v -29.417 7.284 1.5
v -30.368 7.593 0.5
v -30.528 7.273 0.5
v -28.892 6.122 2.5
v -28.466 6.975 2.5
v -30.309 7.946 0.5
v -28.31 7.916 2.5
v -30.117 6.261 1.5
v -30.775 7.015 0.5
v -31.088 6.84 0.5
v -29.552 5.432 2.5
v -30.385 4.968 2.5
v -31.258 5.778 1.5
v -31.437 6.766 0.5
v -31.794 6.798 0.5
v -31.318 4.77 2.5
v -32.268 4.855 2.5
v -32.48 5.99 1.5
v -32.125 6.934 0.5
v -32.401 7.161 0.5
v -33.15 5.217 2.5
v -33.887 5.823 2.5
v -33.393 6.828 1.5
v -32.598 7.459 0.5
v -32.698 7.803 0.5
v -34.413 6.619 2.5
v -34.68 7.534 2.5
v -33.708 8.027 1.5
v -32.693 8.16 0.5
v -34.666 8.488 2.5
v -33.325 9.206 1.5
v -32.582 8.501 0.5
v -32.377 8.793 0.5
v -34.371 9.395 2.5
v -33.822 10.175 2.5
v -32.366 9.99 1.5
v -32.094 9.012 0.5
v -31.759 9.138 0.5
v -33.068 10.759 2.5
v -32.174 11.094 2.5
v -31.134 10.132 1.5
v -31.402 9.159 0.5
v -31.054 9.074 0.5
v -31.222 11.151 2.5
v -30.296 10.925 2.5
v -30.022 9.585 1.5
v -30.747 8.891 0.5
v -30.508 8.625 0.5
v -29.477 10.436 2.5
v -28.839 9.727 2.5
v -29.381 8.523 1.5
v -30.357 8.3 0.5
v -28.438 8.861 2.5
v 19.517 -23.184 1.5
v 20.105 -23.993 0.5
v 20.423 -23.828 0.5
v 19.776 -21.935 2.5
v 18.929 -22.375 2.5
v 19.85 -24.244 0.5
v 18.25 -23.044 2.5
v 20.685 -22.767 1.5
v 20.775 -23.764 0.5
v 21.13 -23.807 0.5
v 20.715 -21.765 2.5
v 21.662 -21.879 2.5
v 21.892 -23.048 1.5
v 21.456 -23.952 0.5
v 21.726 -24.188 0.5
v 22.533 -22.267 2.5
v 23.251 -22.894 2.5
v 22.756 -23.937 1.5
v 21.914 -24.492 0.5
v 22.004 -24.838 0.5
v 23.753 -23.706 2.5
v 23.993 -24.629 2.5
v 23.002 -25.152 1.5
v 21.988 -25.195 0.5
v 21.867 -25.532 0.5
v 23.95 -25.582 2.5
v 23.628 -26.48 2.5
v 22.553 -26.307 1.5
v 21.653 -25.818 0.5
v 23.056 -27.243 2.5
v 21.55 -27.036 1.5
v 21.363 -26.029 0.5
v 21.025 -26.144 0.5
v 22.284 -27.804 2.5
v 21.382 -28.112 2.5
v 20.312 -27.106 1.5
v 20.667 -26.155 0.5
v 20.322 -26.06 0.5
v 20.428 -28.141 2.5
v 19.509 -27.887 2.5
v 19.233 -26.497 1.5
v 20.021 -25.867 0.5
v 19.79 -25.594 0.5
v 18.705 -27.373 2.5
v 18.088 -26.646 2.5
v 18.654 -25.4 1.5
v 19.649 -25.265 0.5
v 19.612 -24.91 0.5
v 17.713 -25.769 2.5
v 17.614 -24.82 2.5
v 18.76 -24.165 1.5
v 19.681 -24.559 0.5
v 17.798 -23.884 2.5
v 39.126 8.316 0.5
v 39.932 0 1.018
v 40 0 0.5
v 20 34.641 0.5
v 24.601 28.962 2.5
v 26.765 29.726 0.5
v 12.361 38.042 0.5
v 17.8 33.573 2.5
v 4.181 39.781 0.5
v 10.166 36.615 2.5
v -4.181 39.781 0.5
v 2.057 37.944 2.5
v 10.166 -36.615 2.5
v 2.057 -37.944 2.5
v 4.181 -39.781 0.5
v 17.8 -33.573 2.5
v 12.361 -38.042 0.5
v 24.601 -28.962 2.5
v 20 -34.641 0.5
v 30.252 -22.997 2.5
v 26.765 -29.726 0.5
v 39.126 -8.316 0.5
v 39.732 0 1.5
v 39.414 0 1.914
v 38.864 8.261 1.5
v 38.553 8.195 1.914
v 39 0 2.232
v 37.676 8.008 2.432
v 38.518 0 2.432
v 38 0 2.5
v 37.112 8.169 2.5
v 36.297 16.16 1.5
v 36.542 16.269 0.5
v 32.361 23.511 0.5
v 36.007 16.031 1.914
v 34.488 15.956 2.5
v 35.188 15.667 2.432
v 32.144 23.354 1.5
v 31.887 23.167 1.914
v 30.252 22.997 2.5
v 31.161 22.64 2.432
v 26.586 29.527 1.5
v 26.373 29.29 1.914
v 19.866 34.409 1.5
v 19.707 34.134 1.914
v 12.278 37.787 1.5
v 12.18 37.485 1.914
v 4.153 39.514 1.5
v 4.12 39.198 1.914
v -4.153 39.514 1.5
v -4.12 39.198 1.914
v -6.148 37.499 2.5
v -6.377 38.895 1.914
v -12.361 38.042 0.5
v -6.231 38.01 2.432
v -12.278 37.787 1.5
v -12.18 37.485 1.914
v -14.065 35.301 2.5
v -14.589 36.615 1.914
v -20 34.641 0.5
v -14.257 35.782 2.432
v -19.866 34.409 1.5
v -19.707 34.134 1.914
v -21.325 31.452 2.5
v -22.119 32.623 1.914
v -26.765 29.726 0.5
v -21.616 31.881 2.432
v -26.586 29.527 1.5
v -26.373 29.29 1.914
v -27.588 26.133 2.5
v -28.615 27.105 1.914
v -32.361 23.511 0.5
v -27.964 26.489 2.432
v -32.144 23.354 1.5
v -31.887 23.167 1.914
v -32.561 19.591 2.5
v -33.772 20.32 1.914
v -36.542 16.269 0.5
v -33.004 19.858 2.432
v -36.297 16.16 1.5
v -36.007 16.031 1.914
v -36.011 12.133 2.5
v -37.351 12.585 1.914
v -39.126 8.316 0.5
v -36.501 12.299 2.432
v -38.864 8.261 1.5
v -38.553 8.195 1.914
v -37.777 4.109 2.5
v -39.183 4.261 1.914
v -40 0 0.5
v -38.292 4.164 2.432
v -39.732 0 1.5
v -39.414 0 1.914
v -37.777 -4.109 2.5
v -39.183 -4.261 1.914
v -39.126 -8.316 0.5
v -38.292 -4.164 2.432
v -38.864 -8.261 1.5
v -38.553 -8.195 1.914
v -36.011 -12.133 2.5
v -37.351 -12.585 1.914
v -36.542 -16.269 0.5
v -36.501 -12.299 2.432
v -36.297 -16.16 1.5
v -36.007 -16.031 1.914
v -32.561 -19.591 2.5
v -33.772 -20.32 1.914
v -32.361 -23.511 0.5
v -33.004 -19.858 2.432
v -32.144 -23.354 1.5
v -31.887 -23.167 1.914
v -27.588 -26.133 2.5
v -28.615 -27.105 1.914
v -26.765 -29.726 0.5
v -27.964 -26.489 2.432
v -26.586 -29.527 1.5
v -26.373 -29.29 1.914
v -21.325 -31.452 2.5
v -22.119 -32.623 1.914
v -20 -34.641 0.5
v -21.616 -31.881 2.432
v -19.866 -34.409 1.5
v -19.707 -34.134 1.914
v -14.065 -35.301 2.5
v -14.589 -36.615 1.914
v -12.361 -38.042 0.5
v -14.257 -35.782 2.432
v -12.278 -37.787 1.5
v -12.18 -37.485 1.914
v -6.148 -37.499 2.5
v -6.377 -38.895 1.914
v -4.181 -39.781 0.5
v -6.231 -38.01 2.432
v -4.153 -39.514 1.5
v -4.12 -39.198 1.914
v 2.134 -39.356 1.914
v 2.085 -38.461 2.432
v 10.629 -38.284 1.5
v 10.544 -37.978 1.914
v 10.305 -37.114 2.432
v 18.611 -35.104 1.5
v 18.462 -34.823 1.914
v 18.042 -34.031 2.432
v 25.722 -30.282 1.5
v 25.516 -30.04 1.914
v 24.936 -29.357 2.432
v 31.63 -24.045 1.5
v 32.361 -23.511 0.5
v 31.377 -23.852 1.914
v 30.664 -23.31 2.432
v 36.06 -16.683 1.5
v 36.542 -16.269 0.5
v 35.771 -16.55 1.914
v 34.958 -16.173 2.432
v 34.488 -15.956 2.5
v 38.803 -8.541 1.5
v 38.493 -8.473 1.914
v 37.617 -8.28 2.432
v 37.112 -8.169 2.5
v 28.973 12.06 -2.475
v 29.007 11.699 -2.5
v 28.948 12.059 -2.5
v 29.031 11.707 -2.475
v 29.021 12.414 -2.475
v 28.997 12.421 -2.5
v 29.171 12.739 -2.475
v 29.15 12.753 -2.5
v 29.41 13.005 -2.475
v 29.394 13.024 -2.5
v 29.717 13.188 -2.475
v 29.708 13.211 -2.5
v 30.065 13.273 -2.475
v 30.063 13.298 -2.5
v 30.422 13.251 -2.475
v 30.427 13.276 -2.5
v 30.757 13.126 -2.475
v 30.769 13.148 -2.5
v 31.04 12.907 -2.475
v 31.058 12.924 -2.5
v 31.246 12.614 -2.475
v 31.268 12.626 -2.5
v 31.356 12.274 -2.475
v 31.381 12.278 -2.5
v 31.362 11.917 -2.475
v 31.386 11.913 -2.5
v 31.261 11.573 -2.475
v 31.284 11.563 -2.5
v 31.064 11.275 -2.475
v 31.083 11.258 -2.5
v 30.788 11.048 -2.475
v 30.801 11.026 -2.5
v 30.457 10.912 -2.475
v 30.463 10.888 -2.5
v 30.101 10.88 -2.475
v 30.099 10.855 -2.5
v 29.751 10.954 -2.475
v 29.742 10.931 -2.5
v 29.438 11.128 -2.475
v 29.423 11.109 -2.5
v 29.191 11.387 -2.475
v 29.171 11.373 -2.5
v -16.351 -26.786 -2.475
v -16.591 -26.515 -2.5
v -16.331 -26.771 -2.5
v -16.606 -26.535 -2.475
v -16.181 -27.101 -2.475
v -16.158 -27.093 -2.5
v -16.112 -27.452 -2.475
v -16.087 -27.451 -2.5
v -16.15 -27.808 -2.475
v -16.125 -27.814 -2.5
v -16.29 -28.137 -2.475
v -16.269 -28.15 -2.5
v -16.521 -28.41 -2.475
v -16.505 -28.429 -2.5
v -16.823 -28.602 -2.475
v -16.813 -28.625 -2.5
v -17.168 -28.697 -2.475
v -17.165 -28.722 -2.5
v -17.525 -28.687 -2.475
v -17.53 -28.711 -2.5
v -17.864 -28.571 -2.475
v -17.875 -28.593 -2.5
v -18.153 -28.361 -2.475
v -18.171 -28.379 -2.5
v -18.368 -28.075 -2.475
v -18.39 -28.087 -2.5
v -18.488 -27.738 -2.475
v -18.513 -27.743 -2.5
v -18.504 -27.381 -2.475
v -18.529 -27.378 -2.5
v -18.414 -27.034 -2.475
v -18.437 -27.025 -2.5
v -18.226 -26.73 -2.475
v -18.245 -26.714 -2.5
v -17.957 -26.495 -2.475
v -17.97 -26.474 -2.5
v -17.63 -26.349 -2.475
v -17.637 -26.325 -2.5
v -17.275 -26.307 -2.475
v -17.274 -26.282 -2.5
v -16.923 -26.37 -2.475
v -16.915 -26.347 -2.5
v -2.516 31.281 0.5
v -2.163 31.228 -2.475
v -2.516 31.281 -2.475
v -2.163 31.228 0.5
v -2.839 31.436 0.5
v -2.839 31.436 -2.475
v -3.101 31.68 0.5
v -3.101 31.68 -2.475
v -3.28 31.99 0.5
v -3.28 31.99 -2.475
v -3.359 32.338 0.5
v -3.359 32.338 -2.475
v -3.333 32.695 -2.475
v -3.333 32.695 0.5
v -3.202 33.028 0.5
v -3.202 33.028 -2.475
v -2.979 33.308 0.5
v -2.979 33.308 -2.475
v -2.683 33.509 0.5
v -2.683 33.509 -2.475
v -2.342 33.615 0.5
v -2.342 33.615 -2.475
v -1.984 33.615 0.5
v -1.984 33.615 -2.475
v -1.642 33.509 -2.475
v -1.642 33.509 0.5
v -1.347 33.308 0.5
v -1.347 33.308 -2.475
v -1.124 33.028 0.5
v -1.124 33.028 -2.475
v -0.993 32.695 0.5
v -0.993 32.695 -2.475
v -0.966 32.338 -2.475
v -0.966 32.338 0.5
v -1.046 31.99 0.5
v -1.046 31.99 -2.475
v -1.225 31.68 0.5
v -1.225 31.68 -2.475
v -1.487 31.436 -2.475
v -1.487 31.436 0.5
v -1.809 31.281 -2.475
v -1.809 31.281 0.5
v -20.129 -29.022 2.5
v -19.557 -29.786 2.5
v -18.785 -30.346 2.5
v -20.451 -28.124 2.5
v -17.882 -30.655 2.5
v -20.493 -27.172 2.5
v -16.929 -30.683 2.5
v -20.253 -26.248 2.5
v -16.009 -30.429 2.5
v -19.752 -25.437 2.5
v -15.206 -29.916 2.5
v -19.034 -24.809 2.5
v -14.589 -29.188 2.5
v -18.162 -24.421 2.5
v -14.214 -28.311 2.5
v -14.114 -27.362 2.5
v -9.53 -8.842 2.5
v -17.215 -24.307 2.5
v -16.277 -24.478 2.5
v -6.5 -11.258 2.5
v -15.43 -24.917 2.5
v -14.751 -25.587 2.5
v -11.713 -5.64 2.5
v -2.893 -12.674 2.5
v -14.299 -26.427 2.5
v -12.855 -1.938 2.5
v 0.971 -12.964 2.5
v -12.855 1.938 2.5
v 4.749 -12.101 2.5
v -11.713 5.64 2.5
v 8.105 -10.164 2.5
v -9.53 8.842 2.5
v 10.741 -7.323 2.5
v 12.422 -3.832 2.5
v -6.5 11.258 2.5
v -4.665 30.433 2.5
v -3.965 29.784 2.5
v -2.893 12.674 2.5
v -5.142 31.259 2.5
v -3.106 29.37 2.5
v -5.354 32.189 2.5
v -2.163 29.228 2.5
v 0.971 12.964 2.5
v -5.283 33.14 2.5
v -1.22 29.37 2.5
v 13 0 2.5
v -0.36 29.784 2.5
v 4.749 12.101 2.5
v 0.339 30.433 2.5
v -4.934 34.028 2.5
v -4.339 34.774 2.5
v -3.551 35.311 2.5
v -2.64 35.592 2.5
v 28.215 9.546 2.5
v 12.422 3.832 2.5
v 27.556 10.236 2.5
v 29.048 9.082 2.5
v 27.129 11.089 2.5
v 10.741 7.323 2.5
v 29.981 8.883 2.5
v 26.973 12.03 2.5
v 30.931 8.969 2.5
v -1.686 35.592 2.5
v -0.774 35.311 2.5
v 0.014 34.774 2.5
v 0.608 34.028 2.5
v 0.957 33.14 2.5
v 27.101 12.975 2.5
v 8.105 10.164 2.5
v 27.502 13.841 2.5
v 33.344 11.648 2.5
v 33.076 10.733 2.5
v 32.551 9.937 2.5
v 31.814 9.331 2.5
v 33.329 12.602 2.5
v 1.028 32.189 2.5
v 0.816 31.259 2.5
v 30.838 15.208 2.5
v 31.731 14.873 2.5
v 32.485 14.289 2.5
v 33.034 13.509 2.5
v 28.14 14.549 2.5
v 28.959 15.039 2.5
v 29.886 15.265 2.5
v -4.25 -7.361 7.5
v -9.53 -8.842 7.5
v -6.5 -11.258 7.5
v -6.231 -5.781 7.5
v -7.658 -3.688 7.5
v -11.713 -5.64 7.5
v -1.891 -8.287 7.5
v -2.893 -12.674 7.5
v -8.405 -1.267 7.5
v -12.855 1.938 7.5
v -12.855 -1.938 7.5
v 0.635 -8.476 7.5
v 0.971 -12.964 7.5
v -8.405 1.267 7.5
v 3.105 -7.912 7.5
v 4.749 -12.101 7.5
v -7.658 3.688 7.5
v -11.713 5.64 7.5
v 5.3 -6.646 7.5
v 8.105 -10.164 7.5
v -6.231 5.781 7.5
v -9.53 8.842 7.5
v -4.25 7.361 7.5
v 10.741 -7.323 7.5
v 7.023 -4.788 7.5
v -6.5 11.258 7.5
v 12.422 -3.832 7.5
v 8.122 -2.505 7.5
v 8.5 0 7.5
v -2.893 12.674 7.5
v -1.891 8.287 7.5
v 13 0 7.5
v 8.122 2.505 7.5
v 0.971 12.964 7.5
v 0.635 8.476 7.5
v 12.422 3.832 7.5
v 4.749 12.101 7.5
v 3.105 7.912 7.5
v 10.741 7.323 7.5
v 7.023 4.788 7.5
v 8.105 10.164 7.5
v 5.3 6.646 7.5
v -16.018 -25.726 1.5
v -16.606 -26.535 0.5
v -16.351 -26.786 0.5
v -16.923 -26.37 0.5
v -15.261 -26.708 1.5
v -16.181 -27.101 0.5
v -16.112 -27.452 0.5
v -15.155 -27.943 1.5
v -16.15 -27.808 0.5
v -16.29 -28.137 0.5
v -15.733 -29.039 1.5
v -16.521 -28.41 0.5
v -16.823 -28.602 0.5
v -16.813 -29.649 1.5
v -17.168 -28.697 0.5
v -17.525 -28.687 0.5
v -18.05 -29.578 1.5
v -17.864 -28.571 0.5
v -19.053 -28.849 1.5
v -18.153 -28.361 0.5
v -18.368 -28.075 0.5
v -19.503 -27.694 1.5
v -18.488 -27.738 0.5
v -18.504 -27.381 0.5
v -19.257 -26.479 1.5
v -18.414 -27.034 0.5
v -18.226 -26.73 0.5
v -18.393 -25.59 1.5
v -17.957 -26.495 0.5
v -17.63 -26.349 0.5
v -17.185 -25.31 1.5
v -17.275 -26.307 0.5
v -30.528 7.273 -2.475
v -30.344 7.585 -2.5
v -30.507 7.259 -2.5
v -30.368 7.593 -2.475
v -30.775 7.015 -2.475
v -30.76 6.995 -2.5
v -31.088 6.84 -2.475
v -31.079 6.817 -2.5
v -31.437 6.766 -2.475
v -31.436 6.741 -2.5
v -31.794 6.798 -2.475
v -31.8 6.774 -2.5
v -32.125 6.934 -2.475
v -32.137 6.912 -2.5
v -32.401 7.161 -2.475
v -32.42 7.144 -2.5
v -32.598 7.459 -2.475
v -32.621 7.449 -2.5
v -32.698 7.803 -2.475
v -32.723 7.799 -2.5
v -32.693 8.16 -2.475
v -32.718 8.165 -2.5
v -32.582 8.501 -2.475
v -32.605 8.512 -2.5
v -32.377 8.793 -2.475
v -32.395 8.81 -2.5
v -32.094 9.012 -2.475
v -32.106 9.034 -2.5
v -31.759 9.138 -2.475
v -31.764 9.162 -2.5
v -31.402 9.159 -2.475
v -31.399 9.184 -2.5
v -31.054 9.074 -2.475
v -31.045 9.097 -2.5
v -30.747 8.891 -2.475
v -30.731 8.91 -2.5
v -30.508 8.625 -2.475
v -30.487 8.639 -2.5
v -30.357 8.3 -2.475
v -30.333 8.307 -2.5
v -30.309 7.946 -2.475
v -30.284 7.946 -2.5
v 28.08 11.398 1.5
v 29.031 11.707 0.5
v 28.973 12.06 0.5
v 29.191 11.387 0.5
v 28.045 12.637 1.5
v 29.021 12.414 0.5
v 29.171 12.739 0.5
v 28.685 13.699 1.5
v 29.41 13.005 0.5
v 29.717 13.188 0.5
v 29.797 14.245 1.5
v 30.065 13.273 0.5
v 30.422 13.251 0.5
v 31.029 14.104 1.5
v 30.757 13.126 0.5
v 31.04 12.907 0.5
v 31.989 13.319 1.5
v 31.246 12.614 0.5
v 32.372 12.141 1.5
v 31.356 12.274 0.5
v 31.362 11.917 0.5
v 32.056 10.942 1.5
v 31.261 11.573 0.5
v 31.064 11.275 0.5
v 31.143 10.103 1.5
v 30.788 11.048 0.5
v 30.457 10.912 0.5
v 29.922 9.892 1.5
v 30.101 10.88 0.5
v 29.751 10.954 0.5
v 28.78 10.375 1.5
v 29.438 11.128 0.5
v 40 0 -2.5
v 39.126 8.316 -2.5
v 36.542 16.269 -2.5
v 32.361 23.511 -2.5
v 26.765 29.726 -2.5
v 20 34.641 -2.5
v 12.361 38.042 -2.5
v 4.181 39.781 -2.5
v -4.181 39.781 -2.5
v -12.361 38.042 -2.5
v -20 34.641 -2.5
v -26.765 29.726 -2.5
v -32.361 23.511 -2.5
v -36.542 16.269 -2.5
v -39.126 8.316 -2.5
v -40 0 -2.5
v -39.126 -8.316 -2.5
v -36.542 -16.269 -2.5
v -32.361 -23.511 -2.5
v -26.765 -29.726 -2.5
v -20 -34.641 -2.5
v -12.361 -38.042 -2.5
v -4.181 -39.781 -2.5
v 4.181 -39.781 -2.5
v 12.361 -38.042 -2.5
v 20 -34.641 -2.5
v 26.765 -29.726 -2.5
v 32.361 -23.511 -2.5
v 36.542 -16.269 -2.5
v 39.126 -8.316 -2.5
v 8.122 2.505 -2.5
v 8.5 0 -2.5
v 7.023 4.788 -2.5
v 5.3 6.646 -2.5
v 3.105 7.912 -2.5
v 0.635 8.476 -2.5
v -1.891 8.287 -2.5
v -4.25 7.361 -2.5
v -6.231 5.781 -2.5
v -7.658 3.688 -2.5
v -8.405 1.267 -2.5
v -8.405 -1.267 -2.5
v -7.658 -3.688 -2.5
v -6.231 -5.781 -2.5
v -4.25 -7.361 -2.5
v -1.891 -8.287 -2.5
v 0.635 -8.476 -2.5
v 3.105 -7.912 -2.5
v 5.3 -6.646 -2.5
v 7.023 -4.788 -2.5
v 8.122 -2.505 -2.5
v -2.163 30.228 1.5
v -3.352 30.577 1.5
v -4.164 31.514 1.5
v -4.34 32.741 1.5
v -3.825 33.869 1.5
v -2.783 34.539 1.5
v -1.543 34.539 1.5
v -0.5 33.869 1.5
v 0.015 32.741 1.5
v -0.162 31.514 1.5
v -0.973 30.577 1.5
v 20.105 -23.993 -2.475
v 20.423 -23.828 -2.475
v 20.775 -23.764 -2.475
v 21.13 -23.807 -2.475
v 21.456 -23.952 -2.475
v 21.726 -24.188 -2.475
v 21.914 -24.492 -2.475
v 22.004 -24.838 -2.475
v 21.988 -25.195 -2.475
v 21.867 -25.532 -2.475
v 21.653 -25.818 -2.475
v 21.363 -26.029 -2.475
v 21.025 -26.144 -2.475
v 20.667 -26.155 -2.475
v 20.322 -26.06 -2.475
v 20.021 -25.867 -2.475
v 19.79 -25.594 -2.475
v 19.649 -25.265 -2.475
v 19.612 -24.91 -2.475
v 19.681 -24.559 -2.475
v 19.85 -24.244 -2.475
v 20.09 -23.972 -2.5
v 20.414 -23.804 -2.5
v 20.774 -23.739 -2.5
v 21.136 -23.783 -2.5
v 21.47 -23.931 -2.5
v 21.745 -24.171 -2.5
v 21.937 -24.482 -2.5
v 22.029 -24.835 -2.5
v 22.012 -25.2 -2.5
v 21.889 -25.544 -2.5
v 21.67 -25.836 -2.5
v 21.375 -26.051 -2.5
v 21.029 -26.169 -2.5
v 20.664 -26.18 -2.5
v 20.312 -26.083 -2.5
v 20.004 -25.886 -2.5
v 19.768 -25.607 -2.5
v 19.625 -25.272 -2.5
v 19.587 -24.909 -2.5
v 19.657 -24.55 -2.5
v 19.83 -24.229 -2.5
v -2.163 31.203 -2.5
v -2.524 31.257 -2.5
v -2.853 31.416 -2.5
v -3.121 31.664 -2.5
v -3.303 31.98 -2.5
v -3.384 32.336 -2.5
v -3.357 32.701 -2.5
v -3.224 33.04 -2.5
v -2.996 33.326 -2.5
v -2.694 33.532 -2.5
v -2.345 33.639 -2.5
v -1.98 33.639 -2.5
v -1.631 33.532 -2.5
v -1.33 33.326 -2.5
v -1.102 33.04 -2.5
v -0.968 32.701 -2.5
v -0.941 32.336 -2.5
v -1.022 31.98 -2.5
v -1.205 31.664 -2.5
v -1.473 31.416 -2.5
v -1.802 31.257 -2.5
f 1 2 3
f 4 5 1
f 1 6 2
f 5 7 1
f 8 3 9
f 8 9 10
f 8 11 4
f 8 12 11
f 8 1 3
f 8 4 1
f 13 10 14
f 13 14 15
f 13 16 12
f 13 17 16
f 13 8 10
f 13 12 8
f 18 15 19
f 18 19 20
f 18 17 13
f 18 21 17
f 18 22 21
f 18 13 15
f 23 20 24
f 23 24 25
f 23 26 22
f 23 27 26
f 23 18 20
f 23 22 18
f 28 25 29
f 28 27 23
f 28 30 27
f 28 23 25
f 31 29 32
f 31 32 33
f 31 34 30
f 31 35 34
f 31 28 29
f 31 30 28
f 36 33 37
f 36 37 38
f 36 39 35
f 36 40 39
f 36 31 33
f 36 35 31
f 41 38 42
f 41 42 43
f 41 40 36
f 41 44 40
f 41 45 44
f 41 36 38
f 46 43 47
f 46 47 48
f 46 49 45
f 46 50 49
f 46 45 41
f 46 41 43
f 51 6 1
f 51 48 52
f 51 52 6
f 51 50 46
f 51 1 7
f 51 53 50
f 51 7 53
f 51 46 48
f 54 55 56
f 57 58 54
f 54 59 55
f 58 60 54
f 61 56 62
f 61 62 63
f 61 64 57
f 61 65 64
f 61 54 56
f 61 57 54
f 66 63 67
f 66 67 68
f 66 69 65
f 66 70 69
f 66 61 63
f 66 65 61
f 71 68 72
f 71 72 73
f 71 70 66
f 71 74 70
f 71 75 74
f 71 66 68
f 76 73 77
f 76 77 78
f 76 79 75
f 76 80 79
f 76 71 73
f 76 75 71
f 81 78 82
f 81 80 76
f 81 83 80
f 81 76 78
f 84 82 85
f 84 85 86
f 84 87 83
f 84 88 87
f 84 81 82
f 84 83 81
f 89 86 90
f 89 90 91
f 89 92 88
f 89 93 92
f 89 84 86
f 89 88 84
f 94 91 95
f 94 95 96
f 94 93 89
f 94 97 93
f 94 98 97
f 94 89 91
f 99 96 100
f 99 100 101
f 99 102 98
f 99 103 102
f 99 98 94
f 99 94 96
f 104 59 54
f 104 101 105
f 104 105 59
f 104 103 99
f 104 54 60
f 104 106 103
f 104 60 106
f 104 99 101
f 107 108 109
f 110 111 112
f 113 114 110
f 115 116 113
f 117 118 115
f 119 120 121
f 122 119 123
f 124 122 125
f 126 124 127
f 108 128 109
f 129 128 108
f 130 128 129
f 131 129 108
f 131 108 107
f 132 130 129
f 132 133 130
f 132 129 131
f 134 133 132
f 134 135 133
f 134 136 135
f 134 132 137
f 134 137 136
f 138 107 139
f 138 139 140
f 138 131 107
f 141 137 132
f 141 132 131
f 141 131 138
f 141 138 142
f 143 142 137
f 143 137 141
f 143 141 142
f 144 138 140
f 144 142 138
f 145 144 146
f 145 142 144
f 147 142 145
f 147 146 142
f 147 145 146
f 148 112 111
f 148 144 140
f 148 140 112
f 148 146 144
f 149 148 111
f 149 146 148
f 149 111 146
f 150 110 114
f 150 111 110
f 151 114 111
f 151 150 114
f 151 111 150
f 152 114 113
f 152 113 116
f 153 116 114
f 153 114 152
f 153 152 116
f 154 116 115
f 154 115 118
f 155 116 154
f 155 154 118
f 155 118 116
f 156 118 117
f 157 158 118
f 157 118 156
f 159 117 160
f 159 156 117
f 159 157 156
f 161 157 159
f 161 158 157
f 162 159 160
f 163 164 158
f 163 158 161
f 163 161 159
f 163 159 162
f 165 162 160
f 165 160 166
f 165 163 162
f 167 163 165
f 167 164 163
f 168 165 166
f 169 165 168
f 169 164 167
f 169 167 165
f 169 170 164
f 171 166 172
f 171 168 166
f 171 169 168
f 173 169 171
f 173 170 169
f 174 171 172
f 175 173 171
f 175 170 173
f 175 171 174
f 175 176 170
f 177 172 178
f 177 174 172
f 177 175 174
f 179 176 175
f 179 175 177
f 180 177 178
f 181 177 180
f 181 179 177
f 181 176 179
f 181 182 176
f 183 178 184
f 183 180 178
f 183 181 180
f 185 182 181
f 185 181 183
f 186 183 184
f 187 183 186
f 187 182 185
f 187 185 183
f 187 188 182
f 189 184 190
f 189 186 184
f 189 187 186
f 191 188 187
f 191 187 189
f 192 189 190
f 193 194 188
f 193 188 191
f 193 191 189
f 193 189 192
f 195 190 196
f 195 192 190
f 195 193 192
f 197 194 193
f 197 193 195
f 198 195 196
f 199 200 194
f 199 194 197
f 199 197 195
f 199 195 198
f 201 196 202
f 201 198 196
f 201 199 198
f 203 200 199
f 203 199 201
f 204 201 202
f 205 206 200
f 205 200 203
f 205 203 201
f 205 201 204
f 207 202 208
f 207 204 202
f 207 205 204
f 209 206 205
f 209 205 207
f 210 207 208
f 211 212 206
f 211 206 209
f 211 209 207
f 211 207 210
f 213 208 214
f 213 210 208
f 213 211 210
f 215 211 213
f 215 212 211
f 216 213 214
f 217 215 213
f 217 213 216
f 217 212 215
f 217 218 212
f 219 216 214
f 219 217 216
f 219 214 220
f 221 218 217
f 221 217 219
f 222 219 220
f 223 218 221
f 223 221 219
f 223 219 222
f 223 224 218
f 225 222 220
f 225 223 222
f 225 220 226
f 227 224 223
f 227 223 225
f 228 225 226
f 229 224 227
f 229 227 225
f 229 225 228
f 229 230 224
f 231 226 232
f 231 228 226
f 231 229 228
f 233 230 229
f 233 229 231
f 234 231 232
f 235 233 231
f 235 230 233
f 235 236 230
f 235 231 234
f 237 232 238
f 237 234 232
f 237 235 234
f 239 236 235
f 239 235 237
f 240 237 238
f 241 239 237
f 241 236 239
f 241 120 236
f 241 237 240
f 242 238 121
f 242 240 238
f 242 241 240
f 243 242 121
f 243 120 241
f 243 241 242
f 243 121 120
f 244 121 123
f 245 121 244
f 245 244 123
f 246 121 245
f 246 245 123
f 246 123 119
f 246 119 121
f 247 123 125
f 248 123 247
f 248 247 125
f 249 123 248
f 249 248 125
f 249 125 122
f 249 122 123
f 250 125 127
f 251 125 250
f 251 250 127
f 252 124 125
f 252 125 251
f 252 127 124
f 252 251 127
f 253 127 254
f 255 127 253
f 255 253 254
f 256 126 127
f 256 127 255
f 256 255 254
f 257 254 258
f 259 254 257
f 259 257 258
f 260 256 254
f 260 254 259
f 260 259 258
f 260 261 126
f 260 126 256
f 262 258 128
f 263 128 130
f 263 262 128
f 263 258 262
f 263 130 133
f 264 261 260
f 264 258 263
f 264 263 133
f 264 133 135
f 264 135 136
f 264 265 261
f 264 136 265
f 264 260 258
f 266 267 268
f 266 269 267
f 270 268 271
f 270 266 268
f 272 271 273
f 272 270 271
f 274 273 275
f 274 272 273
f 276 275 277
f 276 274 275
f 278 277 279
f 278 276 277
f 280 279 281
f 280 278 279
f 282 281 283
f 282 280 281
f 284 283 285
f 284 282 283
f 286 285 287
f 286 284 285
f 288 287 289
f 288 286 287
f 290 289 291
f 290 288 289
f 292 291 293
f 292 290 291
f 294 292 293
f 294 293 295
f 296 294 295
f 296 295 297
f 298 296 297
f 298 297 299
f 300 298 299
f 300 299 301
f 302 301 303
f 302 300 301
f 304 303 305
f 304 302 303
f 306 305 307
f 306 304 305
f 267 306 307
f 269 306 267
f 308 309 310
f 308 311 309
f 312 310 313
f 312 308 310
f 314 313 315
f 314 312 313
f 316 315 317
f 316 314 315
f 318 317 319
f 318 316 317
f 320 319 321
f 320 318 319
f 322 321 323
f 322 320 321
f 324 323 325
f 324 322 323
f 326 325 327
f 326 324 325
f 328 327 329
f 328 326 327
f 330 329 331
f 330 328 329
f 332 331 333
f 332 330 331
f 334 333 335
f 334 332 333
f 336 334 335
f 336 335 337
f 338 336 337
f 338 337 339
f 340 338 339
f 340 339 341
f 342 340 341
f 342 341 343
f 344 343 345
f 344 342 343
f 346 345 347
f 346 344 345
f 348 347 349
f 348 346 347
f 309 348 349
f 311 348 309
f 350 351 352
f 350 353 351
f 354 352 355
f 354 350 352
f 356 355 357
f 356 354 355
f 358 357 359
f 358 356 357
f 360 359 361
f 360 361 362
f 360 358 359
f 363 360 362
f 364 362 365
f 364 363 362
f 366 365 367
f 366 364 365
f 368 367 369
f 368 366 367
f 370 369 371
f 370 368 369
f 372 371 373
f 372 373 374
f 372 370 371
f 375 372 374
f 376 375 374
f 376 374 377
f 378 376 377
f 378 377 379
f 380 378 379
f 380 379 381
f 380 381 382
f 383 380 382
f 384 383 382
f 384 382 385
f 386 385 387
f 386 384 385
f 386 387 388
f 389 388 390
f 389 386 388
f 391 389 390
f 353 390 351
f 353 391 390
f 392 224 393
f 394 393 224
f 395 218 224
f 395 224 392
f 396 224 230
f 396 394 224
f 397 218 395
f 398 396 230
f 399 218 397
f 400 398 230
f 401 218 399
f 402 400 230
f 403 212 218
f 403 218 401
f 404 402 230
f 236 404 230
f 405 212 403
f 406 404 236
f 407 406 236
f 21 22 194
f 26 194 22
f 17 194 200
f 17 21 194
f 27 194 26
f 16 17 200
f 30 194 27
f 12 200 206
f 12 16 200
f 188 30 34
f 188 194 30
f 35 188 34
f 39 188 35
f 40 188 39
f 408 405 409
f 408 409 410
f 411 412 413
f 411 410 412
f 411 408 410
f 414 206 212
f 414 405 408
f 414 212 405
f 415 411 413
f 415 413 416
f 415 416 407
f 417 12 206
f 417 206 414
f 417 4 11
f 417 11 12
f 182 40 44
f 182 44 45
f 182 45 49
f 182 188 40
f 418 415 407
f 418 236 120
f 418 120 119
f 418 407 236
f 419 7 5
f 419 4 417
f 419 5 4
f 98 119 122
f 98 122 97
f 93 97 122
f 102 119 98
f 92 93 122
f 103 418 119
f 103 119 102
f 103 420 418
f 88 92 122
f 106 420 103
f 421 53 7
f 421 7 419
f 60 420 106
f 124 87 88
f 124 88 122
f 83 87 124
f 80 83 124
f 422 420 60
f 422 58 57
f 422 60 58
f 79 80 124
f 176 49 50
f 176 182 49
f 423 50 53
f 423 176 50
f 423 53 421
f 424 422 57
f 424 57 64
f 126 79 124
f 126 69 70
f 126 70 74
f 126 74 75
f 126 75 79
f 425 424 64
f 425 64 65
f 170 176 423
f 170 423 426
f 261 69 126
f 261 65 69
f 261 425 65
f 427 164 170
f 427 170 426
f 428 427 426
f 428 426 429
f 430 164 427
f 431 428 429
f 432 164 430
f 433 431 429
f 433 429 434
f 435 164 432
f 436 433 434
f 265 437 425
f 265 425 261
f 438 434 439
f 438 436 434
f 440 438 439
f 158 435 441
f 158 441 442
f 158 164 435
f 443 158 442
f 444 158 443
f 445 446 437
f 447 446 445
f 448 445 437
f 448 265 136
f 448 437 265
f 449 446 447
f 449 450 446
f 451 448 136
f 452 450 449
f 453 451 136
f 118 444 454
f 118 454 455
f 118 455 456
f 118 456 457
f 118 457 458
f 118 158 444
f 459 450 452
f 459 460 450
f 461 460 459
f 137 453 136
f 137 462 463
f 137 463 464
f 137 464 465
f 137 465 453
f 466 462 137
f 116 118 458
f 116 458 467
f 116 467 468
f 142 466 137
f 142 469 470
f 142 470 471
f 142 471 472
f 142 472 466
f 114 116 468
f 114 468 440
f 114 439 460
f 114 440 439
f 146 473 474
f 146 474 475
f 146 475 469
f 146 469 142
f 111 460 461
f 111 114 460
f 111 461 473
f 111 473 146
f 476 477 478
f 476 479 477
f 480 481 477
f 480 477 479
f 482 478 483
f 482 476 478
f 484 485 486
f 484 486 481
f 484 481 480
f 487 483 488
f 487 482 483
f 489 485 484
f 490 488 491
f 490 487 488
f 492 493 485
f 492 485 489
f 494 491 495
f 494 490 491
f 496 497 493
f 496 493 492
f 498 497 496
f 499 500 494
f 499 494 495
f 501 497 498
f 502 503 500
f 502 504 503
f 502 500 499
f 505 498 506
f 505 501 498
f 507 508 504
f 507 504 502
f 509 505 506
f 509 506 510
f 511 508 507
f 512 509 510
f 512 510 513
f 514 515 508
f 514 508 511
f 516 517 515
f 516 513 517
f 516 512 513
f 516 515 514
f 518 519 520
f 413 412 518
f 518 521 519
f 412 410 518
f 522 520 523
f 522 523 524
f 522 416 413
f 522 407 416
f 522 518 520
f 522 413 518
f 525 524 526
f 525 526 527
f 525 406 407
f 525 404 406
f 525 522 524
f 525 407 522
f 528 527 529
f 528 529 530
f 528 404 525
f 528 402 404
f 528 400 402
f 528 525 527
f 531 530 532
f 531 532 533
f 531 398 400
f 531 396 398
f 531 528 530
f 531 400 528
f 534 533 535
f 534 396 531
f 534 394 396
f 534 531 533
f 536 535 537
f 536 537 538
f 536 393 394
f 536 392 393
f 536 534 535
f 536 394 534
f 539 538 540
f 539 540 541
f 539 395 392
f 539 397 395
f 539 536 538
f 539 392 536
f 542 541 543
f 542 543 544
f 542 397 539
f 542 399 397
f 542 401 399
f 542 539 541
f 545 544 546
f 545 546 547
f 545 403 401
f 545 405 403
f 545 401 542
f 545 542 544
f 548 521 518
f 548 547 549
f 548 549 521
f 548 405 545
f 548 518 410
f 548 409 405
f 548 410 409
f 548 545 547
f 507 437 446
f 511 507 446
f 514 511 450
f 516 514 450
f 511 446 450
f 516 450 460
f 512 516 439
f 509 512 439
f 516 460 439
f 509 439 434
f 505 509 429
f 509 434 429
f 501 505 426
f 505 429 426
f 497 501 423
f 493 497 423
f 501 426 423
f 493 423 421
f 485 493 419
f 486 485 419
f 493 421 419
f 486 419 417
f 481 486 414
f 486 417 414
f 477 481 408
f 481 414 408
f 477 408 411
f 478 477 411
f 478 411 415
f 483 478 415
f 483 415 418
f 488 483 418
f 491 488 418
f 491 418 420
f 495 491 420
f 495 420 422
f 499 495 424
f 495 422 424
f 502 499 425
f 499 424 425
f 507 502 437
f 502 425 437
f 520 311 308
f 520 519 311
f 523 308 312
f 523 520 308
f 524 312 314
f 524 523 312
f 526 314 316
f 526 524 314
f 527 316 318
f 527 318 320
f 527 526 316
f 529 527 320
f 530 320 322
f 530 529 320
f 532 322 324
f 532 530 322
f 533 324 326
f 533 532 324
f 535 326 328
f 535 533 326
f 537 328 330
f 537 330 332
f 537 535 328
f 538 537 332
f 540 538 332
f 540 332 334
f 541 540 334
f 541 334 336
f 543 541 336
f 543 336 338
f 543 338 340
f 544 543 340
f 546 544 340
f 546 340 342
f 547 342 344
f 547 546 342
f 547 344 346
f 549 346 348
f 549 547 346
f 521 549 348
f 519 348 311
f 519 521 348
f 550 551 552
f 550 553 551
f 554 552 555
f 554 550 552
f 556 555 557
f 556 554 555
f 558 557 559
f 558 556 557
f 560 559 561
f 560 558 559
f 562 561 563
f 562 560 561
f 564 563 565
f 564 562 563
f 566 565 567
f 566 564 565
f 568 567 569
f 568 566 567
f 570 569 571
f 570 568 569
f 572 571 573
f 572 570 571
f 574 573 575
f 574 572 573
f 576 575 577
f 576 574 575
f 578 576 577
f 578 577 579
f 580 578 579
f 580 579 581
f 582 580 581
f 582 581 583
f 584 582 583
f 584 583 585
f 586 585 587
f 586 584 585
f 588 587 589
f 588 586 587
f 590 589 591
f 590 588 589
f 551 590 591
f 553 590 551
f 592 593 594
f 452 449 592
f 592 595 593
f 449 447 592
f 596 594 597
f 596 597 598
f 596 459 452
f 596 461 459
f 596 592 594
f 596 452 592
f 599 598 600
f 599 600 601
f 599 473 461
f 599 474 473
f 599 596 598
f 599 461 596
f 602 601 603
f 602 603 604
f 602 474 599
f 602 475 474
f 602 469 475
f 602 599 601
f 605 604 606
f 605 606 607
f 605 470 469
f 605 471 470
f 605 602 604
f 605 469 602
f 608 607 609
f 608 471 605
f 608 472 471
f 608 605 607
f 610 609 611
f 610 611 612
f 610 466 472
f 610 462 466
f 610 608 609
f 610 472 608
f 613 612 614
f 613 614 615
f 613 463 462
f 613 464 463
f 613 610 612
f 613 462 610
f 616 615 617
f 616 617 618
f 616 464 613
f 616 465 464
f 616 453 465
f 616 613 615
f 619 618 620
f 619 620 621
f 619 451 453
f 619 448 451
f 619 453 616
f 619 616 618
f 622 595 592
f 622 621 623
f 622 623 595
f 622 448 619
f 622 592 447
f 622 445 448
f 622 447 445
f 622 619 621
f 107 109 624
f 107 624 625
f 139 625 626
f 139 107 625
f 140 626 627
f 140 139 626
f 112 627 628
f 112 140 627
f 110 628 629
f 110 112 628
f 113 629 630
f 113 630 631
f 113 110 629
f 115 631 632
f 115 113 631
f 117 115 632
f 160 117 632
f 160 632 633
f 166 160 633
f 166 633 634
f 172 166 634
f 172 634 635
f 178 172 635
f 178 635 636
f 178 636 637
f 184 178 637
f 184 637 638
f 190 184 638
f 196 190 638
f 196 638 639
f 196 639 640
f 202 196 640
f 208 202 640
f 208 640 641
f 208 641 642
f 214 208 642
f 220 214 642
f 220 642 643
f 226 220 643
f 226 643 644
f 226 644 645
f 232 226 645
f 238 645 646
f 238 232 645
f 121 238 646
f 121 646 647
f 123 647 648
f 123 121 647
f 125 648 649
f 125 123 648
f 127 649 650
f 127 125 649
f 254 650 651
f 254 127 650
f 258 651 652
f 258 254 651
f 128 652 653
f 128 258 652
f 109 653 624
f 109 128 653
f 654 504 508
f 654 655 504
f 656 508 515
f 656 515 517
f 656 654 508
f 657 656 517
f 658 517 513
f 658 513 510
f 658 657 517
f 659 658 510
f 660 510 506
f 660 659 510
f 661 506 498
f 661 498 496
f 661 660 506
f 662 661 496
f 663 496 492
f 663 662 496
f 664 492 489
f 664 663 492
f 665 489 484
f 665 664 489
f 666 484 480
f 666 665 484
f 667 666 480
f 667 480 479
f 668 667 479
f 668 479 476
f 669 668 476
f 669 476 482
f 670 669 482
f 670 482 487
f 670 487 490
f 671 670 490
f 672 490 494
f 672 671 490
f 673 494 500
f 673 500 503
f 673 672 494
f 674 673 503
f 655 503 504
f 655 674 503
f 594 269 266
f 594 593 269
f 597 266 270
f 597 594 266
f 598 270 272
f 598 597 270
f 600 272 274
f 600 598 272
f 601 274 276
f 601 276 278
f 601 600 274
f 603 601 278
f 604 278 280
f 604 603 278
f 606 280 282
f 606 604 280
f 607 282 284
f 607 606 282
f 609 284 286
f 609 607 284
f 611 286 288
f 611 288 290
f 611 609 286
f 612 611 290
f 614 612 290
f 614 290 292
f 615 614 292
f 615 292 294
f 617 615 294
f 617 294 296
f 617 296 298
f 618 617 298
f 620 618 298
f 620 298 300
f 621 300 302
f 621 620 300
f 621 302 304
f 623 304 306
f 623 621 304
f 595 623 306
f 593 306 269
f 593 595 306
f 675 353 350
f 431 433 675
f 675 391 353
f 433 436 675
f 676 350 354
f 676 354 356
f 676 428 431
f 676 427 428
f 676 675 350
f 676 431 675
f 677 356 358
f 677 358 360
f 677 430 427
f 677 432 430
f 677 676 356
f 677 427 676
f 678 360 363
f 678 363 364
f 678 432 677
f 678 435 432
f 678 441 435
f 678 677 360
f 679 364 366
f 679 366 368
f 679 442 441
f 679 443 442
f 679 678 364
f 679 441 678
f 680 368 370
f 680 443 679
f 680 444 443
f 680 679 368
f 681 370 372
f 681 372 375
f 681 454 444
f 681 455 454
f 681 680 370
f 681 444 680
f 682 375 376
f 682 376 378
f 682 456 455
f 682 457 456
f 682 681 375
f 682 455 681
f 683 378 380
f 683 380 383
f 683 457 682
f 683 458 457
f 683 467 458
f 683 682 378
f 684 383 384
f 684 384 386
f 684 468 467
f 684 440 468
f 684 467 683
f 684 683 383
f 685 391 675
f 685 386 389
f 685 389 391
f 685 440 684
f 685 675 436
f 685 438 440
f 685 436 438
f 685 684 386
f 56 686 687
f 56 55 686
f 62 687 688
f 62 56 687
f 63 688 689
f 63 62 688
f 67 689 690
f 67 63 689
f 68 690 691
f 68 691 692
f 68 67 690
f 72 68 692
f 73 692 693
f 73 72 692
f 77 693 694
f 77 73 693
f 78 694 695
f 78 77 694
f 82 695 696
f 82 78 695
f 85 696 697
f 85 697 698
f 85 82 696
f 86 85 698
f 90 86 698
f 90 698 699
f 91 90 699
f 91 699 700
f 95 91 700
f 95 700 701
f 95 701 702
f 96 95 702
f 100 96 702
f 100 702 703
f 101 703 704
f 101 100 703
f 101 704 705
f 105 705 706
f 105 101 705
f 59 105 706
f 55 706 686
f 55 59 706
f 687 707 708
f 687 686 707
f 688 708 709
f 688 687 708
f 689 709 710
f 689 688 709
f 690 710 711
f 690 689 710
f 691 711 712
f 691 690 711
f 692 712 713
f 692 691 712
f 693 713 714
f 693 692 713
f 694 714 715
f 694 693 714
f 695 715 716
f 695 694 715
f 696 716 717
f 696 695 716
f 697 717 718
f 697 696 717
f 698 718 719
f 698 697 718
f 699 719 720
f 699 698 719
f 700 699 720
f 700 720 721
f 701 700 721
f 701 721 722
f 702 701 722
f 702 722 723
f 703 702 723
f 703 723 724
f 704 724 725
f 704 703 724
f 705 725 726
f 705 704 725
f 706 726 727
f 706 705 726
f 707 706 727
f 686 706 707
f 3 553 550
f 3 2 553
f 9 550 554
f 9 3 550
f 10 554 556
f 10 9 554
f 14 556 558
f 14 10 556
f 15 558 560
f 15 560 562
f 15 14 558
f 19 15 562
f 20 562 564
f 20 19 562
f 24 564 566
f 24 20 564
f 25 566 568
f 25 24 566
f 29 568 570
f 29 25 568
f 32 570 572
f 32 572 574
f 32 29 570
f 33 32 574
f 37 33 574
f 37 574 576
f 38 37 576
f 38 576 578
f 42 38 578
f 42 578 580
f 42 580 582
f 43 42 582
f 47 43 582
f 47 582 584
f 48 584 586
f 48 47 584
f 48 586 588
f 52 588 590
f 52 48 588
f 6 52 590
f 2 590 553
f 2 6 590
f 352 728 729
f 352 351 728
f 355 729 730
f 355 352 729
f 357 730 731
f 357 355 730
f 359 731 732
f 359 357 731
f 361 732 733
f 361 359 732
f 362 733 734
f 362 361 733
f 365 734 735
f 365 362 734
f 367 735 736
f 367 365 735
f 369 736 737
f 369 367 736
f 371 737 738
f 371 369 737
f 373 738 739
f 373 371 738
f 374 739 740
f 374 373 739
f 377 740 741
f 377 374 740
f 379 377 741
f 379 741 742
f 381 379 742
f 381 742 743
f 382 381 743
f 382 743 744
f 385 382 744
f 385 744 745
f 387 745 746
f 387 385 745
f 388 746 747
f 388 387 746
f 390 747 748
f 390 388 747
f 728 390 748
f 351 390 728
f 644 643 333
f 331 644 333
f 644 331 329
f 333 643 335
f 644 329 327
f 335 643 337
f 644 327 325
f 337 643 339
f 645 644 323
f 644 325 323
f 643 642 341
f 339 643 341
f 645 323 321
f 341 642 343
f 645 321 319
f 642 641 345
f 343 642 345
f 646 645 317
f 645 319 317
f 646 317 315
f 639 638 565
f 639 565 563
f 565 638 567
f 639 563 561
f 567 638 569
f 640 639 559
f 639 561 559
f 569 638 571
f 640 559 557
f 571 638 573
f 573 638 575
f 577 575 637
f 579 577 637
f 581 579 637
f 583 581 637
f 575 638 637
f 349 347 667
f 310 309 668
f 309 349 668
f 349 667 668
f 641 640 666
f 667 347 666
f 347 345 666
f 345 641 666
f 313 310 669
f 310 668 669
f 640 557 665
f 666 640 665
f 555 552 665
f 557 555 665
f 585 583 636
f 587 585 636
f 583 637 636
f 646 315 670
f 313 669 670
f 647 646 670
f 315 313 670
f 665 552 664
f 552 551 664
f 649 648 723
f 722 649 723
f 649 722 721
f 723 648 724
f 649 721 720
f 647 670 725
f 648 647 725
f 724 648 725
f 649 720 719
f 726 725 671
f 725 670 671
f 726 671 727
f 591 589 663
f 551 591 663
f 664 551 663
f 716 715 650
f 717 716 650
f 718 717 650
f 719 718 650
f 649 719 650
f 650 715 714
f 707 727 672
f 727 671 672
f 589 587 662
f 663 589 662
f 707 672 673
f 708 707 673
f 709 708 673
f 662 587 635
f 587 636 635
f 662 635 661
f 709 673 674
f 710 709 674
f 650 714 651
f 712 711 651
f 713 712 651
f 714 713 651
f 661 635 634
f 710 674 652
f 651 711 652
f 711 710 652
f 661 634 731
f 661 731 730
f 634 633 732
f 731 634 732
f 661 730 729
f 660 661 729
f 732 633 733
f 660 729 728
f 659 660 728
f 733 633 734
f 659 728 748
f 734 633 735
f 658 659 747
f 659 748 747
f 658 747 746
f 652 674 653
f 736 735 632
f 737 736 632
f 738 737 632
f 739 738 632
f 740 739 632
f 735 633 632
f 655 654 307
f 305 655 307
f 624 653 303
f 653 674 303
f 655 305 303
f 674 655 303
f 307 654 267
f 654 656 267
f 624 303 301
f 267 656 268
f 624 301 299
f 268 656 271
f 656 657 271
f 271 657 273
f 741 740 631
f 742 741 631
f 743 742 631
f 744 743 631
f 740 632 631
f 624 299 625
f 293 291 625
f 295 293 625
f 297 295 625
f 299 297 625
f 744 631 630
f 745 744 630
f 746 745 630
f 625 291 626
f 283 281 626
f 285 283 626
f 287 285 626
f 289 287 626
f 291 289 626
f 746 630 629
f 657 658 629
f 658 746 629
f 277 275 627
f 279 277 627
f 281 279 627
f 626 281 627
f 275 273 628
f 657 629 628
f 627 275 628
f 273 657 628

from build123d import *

# Parameters (mm, degrees)
SKETCH1_R           = 40
SKETCH1_R_2         = 8.5
BOSS_EXTRUDE1_DEPTH = 2.5
FILLET2_R           = 2
CIRPATTERN1_COUNT   = 5
SKETCH6_R           = 13
SKETCH6_R_2         = 8.5
BOSS_EXTRUDE2_DEPTH = 5


with BuildPart() as part:
    # Sketch1 → Boss-Extrude1 (new body, symmetric)
    with BuildSketch(Plane.XY):
        Circle(SKETCH1_R)
        Circle(SKETCH1_R_2, mode=Mode.SUBTRACT)
    extrude(amount=BOSS_EXTRUDE1_DEPTH, both=True)

    # Fillet2
    fillet2_edges = [part.edges().sort_by_distance(p)[0] for p in [
        (-40, 0, 2.5),
    ]]
    fillet(fillet2_edges, radius=FILLET2_R)

    # Sketch5 → CSK for M2 Flat Head Machine Screw1 (revolve, cut)
    with BuildSketch(Plane(origin=(-2.162785463, 32.427956443, 2.5), x_dir=(0, -1, 0), z_dir=(1, 0, 0))):
        Polygon((0, 0), (0, 5), (1.225, 5), (1.2, 4.975), (1.2, 2), (3.2, 0), align=None)
    csk_for_m2_flat_head_machine_screw1 = revolve(axis=Axis((-2.162785463, 32.427956443, 8.85), (0, 0, -1)), mode=Mode.SUBTRACT)

    # CirPattern1: CSK for M2 Flat Head Machine Screw1 ×5 about axis
    cirpattern1_axis = Axis((0, 0, 0), (0, 0, 1))
    for i in range(1, CIRPATTERN1_COUNT):
        add(csk_for_m2_flat_head_machine_screw1.rotate(cirpattern1_axis, i * 360 / CIRPATTERN1_COUNT), mode=Mode.SUBTRACT)

    # Sketch6 → Boss-Extrude2 (add)
    with BuildSketch(Plane.XY.offset(2.5)):
        Circle(SKETCH6_R)
        Circle(SKETCH6_R_2, mode=Mode.SUBTRACT)
    extrude(amount=BOSS_EXTRUDE2_DEPTH)


solid = part.part
